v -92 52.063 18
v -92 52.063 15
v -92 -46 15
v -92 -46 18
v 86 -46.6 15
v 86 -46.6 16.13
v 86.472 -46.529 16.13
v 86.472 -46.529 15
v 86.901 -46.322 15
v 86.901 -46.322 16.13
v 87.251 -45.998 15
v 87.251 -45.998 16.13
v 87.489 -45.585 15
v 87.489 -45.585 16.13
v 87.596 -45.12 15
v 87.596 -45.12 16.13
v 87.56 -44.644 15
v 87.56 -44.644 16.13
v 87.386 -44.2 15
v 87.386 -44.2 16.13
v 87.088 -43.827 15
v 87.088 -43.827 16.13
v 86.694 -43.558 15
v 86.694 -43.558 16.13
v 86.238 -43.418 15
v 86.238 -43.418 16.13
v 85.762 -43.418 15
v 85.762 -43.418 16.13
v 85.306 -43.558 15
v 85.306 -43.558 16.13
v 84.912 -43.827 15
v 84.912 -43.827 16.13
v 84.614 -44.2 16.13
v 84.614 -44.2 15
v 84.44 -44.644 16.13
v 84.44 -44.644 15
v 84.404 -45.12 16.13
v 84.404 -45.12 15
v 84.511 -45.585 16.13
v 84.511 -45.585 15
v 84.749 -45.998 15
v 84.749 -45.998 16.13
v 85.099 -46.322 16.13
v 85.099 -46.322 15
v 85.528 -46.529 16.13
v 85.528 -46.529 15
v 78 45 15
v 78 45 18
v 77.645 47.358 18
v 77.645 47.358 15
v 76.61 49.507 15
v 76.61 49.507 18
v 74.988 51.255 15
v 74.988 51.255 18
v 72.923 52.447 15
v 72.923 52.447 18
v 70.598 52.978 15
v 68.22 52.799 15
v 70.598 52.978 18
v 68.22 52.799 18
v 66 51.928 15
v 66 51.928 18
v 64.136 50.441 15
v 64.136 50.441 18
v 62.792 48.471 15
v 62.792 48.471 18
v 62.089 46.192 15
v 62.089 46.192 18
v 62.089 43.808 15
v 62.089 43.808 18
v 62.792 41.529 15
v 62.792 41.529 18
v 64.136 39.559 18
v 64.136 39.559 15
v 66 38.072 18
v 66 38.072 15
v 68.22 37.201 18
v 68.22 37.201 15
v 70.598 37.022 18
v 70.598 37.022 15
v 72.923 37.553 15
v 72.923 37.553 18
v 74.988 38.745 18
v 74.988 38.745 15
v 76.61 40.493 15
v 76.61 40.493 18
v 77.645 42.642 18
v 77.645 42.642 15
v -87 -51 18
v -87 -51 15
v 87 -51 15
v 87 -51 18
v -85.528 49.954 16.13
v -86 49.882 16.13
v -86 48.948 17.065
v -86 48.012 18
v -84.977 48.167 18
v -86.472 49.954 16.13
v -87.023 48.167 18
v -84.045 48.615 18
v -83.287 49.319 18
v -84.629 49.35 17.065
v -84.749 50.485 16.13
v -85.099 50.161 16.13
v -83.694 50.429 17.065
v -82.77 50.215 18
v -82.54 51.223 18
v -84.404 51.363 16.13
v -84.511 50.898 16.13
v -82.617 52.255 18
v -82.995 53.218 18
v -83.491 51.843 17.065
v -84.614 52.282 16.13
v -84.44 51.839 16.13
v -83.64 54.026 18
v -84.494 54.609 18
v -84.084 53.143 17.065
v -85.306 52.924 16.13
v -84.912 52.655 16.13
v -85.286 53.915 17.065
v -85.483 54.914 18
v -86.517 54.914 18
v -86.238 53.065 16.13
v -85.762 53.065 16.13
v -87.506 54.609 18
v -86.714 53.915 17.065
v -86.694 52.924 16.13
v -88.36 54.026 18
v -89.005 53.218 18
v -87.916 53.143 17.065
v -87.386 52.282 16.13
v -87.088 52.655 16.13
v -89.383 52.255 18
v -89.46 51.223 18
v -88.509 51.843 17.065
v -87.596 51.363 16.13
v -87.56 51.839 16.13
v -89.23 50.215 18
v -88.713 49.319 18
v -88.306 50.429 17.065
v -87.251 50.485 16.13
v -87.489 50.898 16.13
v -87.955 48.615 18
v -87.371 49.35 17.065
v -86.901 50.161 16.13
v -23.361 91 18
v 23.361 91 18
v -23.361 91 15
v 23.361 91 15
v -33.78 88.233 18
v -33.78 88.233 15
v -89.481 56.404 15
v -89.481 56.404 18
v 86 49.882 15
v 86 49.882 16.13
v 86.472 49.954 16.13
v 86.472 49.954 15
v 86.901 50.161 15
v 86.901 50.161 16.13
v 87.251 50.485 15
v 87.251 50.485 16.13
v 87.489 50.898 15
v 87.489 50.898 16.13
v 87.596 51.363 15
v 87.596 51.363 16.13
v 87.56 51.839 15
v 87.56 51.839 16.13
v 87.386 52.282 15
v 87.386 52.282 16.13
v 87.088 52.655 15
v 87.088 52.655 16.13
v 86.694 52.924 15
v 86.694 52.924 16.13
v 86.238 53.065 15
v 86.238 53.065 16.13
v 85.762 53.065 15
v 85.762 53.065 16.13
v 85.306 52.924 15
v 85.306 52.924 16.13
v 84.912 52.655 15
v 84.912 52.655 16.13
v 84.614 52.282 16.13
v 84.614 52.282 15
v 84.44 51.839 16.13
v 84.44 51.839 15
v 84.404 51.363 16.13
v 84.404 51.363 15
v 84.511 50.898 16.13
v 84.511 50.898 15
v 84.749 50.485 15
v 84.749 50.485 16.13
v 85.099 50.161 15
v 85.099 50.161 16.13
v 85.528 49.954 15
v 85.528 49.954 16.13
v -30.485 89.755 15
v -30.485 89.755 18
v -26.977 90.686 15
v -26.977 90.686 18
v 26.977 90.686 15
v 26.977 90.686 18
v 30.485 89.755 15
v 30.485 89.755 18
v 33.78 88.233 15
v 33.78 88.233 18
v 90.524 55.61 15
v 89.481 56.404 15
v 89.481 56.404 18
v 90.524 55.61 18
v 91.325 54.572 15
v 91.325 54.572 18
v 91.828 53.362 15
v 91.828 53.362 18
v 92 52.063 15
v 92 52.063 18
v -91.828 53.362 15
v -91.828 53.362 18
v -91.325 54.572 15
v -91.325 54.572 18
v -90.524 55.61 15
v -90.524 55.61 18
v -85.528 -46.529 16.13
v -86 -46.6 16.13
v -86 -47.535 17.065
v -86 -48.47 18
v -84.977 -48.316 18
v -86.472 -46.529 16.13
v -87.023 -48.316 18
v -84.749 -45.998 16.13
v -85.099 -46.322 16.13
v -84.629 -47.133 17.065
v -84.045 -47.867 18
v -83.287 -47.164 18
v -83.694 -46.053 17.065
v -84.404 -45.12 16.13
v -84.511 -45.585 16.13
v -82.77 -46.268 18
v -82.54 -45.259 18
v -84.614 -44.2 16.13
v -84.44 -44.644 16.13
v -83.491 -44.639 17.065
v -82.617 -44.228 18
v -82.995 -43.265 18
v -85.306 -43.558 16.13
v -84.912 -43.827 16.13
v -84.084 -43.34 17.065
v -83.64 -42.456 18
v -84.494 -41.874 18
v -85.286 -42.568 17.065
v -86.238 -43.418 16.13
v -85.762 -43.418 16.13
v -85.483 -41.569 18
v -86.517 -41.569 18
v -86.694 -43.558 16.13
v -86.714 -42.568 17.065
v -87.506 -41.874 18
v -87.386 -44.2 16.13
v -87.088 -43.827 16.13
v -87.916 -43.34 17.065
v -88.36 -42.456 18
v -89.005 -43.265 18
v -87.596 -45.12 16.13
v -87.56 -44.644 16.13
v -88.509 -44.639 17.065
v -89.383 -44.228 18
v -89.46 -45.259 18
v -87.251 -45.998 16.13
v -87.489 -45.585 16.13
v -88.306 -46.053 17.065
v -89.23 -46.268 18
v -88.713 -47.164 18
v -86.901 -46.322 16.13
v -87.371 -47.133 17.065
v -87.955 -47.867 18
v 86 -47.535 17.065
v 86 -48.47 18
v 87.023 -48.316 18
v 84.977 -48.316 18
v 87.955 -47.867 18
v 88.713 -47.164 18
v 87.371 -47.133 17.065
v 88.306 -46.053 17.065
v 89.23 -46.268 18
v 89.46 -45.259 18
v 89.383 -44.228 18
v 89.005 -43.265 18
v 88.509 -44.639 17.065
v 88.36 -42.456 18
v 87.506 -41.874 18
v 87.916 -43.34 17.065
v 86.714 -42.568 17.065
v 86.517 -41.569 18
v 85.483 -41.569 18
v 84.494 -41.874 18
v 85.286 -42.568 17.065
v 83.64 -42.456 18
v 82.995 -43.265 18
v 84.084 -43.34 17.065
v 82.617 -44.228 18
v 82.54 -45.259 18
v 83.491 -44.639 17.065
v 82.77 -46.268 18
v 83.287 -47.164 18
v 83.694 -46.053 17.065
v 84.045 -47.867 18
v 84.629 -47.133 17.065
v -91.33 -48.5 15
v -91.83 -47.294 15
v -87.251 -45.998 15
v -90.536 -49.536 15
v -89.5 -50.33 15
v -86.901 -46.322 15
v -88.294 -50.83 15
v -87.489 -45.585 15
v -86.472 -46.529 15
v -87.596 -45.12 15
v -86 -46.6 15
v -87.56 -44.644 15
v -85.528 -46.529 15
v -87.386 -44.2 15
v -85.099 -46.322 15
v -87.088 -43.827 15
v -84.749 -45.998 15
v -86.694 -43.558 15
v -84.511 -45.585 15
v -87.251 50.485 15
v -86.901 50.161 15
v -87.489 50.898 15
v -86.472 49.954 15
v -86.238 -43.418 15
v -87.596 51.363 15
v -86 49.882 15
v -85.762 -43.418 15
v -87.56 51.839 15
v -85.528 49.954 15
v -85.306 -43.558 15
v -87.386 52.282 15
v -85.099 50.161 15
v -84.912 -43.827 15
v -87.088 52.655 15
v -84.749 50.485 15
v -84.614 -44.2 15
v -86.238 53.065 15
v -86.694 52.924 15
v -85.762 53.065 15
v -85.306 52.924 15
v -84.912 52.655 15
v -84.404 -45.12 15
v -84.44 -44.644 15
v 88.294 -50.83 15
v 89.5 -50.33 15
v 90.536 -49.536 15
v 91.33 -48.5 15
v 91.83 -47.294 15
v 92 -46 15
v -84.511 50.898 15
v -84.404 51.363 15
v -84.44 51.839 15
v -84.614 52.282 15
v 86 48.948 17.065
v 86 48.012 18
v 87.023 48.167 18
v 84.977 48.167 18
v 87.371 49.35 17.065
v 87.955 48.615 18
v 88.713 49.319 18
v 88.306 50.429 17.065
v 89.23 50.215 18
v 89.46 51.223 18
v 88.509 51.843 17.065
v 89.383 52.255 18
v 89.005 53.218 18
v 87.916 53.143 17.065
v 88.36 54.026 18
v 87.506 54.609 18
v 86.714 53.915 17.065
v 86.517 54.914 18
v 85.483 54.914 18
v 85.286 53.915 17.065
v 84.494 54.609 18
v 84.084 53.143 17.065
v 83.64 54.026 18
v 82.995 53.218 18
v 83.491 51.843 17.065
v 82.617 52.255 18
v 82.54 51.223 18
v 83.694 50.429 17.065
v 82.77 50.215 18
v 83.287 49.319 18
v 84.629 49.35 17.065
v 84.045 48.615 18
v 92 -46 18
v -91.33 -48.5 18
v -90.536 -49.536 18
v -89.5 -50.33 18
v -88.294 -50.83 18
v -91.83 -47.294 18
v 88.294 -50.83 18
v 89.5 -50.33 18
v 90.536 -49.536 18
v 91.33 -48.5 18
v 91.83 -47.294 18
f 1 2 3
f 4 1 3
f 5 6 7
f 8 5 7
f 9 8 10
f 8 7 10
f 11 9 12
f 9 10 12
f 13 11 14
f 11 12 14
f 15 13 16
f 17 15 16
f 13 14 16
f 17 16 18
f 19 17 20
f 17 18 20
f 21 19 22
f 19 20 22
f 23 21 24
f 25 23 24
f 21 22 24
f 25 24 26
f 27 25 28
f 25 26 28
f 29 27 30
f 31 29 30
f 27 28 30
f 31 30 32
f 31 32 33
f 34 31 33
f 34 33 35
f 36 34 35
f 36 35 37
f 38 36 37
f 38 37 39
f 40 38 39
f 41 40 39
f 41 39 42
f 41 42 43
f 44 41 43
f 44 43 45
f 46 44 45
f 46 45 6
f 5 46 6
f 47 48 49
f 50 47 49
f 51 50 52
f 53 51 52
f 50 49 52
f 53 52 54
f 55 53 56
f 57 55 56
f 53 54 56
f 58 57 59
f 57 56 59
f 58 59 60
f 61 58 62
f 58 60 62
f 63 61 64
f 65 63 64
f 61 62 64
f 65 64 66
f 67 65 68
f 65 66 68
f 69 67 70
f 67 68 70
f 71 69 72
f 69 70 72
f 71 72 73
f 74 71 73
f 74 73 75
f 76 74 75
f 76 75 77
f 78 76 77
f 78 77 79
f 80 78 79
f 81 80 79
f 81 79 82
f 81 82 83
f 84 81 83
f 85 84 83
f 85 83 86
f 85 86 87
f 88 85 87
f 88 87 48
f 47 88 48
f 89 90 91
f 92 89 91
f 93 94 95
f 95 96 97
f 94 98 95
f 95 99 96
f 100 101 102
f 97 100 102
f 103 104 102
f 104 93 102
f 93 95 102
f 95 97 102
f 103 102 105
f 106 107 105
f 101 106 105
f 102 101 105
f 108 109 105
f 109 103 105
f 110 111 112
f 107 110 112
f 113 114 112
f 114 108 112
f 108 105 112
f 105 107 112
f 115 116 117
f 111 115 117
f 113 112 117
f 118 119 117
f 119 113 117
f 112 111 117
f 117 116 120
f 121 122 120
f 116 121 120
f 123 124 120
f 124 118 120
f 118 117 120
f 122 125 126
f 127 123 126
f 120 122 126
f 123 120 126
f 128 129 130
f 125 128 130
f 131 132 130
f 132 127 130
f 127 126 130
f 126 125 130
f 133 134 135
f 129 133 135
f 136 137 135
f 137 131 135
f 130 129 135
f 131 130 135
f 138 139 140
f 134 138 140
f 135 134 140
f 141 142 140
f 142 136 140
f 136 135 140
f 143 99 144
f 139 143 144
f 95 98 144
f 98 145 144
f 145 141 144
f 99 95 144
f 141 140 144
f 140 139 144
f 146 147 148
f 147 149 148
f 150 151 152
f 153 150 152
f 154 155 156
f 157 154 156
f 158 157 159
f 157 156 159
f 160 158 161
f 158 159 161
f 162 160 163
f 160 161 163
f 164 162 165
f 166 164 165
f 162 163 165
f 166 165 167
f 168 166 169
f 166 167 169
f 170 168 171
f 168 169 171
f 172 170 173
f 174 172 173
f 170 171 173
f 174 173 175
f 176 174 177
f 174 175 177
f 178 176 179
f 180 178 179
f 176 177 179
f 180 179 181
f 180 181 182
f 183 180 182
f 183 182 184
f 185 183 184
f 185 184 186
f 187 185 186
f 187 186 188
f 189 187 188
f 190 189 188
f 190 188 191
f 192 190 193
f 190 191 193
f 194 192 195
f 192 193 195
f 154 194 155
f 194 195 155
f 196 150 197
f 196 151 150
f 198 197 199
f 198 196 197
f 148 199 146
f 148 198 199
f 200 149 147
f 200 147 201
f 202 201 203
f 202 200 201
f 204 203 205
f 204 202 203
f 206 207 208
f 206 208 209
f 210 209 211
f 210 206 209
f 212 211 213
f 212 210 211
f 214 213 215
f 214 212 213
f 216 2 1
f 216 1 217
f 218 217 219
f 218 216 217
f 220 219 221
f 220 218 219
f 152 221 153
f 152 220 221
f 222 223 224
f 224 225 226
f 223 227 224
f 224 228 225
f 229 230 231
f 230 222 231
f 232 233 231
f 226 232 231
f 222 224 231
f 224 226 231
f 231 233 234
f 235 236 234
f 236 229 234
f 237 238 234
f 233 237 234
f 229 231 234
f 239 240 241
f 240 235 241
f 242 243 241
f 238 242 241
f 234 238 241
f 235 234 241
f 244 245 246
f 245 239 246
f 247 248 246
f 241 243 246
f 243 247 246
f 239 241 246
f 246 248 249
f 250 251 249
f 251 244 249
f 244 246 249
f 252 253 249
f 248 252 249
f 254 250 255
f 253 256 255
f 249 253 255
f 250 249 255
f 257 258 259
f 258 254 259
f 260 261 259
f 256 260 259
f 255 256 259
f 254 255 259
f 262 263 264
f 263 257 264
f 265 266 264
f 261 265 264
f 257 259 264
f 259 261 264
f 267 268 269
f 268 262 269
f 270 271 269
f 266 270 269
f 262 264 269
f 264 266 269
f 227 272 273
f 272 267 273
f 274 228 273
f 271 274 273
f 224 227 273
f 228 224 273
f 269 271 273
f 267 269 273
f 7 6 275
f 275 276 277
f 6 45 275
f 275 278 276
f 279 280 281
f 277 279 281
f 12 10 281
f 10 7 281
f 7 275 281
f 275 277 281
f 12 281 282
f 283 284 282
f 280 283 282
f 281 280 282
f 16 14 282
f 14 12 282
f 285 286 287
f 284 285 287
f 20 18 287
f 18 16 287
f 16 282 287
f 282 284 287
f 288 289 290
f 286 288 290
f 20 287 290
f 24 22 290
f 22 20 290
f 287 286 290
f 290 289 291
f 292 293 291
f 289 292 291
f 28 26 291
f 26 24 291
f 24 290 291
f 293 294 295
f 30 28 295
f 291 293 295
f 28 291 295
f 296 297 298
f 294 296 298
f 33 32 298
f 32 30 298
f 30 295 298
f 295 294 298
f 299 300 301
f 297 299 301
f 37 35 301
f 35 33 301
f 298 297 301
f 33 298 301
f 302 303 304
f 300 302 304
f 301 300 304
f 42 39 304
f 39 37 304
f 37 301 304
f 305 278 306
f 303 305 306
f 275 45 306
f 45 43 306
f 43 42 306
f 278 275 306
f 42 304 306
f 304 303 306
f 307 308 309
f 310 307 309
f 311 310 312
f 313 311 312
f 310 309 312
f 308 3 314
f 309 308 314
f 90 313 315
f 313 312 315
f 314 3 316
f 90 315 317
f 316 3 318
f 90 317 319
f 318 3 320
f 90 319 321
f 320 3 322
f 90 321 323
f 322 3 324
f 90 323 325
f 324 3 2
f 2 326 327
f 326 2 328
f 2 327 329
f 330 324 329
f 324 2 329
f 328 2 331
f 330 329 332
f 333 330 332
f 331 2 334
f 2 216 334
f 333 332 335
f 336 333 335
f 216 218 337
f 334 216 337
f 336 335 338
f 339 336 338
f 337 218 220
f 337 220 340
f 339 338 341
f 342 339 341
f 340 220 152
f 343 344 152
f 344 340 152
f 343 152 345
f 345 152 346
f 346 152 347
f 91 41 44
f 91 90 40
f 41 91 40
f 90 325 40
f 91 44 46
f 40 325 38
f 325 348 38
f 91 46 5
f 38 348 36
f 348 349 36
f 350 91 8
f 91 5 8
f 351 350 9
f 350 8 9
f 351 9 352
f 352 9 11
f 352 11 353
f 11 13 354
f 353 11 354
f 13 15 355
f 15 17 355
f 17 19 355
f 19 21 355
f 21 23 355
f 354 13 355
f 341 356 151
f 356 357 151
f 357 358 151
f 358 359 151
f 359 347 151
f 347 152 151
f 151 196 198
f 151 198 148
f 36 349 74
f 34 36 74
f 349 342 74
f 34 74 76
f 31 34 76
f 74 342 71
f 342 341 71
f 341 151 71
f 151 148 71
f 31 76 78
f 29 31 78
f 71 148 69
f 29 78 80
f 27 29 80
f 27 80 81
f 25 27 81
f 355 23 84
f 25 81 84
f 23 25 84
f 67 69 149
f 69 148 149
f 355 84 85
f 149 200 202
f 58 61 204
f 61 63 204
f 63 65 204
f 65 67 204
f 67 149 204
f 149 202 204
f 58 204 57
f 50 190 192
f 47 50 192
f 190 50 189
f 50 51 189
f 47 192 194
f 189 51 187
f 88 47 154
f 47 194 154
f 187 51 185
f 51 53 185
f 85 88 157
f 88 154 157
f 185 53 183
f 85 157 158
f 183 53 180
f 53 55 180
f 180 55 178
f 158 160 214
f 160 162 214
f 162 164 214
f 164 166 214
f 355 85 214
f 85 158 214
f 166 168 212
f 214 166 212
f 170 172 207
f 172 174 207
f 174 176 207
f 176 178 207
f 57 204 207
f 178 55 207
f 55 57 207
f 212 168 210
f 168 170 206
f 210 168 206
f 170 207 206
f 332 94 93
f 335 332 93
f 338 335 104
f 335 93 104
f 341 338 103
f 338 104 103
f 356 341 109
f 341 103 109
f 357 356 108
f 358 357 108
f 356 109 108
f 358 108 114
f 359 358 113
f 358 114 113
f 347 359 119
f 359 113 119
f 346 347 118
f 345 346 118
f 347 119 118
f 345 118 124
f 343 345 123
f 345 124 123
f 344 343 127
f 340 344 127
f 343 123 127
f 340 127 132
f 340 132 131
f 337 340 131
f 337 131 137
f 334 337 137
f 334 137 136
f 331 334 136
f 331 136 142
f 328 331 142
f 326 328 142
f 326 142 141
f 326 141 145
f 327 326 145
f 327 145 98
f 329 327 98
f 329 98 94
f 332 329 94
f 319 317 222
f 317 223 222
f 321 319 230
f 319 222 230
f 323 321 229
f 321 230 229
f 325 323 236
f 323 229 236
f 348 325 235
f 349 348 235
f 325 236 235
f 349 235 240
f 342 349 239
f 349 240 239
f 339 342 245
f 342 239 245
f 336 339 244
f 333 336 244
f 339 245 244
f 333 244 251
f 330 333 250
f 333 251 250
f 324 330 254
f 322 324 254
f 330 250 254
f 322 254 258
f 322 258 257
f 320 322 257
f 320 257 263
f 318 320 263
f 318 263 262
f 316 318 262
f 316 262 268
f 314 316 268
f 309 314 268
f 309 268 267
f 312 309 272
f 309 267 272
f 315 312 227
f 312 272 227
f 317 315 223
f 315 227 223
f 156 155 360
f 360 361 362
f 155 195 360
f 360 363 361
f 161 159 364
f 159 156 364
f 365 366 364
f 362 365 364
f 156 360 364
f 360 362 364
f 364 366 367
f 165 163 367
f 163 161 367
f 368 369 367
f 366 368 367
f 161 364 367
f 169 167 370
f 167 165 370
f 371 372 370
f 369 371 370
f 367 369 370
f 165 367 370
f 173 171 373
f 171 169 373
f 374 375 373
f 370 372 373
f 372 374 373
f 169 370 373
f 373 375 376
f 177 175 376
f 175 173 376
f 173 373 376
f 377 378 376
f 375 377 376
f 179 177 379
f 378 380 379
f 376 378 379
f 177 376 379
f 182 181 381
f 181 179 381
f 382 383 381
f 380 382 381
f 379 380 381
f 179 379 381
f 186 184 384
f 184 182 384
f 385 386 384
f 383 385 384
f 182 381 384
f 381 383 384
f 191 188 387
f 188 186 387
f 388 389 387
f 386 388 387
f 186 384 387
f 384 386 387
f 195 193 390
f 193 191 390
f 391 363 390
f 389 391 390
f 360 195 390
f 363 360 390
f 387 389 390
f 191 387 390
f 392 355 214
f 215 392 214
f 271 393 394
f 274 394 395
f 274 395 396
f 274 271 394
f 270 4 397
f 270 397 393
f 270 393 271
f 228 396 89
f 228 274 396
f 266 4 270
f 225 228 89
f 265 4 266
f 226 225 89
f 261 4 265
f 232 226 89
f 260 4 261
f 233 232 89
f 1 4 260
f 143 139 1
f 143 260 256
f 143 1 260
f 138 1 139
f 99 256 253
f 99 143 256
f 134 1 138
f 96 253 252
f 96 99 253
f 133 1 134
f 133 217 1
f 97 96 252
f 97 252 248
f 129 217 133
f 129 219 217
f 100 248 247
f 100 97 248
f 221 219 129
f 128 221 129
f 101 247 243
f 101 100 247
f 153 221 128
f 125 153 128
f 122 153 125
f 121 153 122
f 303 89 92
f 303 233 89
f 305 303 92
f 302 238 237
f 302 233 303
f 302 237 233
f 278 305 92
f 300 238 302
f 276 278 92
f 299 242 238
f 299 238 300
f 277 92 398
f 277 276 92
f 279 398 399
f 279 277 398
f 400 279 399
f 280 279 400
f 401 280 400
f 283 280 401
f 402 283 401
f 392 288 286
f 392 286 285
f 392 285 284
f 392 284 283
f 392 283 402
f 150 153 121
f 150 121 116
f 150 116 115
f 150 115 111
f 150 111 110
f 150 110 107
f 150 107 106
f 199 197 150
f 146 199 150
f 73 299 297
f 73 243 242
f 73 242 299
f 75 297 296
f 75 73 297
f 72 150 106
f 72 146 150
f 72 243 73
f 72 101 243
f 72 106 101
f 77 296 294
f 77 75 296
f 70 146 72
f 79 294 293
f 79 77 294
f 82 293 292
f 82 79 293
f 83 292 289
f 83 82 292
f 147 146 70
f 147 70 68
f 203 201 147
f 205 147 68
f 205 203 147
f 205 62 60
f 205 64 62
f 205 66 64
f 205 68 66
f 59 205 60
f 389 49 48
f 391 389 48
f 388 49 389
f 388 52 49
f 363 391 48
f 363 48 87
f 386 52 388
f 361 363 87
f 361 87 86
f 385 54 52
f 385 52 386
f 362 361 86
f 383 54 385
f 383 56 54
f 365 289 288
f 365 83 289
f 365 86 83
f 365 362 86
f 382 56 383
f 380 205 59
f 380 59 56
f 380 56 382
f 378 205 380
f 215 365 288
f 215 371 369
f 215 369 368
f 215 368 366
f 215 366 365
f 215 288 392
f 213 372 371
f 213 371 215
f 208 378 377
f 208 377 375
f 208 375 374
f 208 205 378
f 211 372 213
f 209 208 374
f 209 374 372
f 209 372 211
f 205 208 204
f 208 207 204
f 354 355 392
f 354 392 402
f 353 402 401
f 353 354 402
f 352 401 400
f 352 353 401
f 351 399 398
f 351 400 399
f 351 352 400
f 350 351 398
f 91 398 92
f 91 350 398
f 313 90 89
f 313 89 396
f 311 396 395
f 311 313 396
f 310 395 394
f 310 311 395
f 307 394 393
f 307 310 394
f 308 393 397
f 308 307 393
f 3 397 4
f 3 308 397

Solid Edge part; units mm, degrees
sketch "Sketch1" plane through (0, 0, 15) normal (0, 0, 1) x (1, 0, 0)
  line L0 (-92, 52.0628) -> (-92, -46)
  arc A0 (-92, -46) -> (-87, -51) centre (-87, -46) ccw
  line L1 (-87, -51) -> (87, -51)
  arc A1 (87, -51) -> (92, -46) centre (87, -46) ccw
  line L2 (92, -46) -> (92, 52.0628)
  arc A2 (92, 52.0628) -> (89.4807, 56.404) centre (87, 52.0628) ccw
  line L3 (89.4807, 56.404) -> (33.7798, 88.2331)
  arc A3 (33.7798, 88.2331) -> (23.3609, 91) centre (23.3609, 70) ccw
  line L4 (23.3609, 91) -> (-23.3609, 91)
  arc A4 (-23.3609, 91) -> (-33.7798, 88.2331) centre (-23.3609, 70) ccw
  line L5 (-33.7798, 88.2331) -> (-89.4807, 56.404)
  arc A5 (-89.4807, 56.404) -> (-92, 52.0628) centre (-87, 52.0628) ccw
extrude "Protrusion1" add sketch "Sketch1" along normal blind 3
hole "Bohrung_1" at (-86, 51.4825, 18) direction (0, 0, -1) diameter 3.2 end through all countersink diameter 6.94 countersink angle 90
hole "Hole1" at (86, 51.4825, 18) direction (0, 0, -1) diameter 3.2 end through all countersink diameter 6.94 countersink angle 90
hole "Hole2" at (86, -45, 18) direction (0, 0, -1) diameter 3.2 end through all countersink diameter 6.94 countersink angle 90
hole "Hole3" at (-86, -45, 18) direction (0, 0, -1) diameter 3.2 end through all countersink diameter 6.94 countersink angle 90
sketch "Sketch2" plane through (0, 20, 18) normal (0, 0, 1) x (1, 0, 0)
  circle A0 centre (70, 25) radius 8
  dimension "D1" = 16
  dimension "D2" = 45
  dimension "D3" = 70
extrude "Cutout1" cut sketch "Sketch2" against normal through all
